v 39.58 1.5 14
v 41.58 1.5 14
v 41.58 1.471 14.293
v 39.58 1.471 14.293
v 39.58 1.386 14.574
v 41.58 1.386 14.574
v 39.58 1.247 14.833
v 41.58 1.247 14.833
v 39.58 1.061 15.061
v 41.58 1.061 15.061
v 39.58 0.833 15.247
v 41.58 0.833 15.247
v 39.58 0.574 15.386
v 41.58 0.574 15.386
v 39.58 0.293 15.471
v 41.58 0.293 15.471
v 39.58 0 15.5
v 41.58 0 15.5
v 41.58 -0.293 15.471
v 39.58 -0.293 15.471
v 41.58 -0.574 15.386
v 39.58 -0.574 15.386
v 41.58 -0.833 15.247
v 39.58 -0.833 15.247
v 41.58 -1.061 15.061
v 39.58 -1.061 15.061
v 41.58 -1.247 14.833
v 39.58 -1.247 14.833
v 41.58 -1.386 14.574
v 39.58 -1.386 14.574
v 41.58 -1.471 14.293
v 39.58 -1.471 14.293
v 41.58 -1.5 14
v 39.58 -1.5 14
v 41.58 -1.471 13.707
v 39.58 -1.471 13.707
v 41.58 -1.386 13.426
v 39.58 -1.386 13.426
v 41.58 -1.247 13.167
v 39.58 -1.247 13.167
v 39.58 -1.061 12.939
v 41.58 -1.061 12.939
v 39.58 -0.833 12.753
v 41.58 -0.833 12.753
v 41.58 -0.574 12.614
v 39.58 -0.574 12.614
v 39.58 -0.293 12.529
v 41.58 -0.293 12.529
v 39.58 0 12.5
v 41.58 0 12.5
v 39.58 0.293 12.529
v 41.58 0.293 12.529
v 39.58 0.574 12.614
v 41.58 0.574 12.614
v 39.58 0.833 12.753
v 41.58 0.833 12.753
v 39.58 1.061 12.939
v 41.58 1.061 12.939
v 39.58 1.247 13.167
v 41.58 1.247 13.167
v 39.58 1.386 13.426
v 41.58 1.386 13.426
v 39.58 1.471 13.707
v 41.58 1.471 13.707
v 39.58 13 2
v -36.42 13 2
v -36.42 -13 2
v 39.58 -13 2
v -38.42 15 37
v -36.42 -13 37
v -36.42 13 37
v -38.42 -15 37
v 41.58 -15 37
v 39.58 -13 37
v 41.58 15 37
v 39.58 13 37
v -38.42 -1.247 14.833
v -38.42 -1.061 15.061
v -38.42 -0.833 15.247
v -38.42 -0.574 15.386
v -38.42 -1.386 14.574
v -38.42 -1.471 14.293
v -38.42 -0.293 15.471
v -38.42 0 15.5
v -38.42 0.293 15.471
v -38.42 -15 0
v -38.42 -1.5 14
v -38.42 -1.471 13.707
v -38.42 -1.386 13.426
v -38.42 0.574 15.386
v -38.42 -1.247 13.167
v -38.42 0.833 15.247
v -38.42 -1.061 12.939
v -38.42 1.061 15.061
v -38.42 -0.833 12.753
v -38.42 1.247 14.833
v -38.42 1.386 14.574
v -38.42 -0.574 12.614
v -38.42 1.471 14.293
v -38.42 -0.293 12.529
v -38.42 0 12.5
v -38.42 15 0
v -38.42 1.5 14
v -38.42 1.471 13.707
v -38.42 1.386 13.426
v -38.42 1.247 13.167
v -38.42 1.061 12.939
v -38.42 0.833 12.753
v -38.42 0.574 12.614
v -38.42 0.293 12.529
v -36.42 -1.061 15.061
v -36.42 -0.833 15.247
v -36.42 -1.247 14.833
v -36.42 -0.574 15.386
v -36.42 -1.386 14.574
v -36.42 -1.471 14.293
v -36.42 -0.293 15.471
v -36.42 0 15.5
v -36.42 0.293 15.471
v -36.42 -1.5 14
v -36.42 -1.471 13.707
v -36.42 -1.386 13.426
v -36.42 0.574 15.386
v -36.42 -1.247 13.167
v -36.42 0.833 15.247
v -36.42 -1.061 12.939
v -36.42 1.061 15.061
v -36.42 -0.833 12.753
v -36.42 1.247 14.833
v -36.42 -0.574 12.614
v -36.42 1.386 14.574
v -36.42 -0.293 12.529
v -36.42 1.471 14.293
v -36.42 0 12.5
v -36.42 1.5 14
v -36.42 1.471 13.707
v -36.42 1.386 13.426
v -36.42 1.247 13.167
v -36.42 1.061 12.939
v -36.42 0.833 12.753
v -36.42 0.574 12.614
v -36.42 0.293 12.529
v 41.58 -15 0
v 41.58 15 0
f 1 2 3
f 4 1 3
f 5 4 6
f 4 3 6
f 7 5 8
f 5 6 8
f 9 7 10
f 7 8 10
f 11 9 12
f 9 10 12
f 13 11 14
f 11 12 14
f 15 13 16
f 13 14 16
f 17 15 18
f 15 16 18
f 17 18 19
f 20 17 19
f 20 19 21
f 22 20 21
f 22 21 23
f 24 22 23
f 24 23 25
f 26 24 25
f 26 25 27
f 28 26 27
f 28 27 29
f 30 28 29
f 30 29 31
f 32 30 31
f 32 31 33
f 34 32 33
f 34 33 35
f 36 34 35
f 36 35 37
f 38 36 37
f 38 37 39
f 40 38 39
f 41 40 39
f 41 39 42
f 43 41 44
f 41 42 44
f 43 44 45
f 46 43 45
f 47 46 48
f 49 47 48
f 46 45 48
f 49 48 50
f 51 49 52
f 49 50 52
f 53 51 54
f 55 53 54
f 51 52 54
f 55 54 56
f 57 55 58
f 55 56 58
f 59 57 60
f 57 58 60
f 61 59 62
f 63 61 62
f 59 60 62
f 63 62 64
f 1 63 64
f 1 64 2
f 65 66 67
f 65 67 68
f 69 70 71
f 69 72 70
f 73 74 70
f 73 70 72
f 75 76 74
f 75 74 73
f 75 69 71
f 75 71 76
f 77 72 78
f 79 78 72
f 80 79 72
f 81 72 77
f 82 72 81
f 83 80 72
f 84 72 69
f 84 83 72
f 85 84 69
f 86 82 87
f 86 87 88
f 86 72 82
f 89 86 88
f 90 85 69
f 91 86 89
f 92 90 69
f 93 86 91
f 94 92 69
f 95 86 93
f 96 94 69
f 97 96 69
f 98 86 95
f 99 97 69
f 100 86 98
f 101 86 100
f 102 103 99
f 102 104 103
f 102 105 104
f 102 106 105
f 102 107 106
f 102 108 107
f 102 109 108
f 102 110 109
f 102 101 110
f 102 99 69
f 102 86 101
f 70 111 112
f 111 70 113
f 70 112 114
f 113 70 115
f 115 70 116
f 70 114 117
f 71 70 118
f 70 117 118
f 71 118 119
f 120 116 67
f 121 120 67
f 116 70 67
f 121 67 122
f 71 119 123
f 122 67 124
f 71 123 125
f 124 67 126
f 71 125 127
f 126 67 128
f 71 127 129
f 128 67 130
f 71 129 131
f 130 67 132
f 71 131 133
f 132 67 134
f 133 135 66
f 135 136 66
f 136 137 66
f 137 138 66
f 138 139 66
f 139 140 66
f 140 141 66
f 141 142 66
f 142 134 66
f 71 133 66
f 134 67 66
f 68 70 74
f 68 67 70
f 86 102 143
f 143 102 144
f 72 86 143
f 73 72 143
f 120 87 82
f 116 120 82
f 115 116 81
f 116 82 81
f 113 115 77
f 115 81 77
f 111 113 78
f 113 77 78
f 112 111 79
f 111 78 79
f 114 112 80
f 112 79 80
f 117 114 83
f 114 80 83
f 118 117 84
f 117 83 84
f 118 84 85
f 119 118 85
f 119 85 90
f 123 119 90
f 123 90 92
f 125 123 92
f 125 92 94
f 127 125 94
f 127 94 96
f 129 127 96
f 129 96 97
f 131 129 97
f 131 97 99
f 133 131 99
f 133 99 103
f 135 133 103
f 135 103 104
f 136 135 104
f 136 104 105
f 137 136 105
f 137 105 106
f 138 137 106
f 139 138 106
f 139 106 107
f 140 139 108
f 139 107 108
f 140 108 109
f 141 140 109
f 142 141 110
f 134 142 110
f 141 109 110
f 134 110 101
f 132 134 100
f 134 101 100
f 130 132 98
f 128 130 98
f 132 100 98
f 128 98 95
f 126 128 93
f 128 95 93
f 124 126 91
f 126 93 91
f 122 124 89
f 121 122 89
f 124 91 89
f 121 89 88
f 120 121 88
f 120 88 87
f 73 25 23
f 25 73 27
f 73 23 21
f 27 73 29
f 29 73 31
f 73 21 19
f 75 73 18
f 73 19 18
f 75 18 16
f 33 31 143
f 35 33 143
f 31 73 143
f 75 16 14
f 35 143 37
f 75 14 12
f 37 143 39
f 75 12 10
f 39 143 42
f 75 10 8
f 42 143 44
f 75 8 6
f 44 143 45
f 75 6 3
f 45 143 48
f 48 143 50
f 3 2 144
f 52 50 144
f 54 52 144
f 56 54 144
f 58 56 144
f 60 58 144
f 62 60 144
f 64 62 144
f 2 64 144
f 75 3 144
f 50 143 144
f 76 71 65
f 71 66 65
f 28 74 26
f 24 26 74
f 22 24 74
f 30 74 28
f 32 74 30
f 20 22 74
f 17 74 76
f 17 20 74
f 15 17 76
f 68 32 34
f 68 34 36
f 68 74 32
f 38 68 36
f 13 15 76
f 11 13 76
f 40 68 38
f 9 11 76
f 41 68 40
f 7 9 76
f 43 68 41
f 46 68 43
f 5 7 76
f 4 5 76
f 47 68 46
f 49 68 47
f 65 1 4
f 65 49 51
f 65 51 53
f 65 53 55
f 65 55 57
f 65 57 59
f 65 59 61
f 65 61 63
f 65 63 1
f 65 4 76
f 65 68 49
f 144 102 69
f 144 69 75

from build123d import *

# Parameters (mm, degrees)
F0_W     = 80
F0_H     = 30
F1_DEPTH = 37
F2_T     = -2
F4_R     = 1.5
F5_DEPTH = 25
F6_R     = 1.5
F7_DEPTH = 3


with BuildPart() as f1:
    # F0 (on Top) → F1 (new body)
    with BuildSketch(Plane.XY):
        with Locations((1.579888, 0)):
            Rectangle(F0_W, F0_H)
    extrude(amount=F1_DEPTH)

    # F2
    f2_openings = [f1.faces().sort_by_distance(p)[0] for p in [
        (1.579888, 0, 37),
    ]]
    offset(amount=F2_T, openings=f2_openings)

    # F4 (on face) → F5 (cut)
    with BuildSketch(Plane.YZ.offset(41.579888)):
        with Locations((0, 14)):
            Circle(F4_R)
    extrude(amount=-F5_DEPTH, mode=Mode.SUBTRACT)

    # F6 (on face) → F7 (cut)
    with BuildSketch(Plane(origin=(-38.420112, 0, 0), x_dir=(0, -1, 0), z_dir=(-1, 0, 0))):
        with Locations((0, 14)):
            Circle(F6_R)
    extrude(amount=-F7_DEPTH, mode=Mode.SUBTRACT)


solid = f1.part
